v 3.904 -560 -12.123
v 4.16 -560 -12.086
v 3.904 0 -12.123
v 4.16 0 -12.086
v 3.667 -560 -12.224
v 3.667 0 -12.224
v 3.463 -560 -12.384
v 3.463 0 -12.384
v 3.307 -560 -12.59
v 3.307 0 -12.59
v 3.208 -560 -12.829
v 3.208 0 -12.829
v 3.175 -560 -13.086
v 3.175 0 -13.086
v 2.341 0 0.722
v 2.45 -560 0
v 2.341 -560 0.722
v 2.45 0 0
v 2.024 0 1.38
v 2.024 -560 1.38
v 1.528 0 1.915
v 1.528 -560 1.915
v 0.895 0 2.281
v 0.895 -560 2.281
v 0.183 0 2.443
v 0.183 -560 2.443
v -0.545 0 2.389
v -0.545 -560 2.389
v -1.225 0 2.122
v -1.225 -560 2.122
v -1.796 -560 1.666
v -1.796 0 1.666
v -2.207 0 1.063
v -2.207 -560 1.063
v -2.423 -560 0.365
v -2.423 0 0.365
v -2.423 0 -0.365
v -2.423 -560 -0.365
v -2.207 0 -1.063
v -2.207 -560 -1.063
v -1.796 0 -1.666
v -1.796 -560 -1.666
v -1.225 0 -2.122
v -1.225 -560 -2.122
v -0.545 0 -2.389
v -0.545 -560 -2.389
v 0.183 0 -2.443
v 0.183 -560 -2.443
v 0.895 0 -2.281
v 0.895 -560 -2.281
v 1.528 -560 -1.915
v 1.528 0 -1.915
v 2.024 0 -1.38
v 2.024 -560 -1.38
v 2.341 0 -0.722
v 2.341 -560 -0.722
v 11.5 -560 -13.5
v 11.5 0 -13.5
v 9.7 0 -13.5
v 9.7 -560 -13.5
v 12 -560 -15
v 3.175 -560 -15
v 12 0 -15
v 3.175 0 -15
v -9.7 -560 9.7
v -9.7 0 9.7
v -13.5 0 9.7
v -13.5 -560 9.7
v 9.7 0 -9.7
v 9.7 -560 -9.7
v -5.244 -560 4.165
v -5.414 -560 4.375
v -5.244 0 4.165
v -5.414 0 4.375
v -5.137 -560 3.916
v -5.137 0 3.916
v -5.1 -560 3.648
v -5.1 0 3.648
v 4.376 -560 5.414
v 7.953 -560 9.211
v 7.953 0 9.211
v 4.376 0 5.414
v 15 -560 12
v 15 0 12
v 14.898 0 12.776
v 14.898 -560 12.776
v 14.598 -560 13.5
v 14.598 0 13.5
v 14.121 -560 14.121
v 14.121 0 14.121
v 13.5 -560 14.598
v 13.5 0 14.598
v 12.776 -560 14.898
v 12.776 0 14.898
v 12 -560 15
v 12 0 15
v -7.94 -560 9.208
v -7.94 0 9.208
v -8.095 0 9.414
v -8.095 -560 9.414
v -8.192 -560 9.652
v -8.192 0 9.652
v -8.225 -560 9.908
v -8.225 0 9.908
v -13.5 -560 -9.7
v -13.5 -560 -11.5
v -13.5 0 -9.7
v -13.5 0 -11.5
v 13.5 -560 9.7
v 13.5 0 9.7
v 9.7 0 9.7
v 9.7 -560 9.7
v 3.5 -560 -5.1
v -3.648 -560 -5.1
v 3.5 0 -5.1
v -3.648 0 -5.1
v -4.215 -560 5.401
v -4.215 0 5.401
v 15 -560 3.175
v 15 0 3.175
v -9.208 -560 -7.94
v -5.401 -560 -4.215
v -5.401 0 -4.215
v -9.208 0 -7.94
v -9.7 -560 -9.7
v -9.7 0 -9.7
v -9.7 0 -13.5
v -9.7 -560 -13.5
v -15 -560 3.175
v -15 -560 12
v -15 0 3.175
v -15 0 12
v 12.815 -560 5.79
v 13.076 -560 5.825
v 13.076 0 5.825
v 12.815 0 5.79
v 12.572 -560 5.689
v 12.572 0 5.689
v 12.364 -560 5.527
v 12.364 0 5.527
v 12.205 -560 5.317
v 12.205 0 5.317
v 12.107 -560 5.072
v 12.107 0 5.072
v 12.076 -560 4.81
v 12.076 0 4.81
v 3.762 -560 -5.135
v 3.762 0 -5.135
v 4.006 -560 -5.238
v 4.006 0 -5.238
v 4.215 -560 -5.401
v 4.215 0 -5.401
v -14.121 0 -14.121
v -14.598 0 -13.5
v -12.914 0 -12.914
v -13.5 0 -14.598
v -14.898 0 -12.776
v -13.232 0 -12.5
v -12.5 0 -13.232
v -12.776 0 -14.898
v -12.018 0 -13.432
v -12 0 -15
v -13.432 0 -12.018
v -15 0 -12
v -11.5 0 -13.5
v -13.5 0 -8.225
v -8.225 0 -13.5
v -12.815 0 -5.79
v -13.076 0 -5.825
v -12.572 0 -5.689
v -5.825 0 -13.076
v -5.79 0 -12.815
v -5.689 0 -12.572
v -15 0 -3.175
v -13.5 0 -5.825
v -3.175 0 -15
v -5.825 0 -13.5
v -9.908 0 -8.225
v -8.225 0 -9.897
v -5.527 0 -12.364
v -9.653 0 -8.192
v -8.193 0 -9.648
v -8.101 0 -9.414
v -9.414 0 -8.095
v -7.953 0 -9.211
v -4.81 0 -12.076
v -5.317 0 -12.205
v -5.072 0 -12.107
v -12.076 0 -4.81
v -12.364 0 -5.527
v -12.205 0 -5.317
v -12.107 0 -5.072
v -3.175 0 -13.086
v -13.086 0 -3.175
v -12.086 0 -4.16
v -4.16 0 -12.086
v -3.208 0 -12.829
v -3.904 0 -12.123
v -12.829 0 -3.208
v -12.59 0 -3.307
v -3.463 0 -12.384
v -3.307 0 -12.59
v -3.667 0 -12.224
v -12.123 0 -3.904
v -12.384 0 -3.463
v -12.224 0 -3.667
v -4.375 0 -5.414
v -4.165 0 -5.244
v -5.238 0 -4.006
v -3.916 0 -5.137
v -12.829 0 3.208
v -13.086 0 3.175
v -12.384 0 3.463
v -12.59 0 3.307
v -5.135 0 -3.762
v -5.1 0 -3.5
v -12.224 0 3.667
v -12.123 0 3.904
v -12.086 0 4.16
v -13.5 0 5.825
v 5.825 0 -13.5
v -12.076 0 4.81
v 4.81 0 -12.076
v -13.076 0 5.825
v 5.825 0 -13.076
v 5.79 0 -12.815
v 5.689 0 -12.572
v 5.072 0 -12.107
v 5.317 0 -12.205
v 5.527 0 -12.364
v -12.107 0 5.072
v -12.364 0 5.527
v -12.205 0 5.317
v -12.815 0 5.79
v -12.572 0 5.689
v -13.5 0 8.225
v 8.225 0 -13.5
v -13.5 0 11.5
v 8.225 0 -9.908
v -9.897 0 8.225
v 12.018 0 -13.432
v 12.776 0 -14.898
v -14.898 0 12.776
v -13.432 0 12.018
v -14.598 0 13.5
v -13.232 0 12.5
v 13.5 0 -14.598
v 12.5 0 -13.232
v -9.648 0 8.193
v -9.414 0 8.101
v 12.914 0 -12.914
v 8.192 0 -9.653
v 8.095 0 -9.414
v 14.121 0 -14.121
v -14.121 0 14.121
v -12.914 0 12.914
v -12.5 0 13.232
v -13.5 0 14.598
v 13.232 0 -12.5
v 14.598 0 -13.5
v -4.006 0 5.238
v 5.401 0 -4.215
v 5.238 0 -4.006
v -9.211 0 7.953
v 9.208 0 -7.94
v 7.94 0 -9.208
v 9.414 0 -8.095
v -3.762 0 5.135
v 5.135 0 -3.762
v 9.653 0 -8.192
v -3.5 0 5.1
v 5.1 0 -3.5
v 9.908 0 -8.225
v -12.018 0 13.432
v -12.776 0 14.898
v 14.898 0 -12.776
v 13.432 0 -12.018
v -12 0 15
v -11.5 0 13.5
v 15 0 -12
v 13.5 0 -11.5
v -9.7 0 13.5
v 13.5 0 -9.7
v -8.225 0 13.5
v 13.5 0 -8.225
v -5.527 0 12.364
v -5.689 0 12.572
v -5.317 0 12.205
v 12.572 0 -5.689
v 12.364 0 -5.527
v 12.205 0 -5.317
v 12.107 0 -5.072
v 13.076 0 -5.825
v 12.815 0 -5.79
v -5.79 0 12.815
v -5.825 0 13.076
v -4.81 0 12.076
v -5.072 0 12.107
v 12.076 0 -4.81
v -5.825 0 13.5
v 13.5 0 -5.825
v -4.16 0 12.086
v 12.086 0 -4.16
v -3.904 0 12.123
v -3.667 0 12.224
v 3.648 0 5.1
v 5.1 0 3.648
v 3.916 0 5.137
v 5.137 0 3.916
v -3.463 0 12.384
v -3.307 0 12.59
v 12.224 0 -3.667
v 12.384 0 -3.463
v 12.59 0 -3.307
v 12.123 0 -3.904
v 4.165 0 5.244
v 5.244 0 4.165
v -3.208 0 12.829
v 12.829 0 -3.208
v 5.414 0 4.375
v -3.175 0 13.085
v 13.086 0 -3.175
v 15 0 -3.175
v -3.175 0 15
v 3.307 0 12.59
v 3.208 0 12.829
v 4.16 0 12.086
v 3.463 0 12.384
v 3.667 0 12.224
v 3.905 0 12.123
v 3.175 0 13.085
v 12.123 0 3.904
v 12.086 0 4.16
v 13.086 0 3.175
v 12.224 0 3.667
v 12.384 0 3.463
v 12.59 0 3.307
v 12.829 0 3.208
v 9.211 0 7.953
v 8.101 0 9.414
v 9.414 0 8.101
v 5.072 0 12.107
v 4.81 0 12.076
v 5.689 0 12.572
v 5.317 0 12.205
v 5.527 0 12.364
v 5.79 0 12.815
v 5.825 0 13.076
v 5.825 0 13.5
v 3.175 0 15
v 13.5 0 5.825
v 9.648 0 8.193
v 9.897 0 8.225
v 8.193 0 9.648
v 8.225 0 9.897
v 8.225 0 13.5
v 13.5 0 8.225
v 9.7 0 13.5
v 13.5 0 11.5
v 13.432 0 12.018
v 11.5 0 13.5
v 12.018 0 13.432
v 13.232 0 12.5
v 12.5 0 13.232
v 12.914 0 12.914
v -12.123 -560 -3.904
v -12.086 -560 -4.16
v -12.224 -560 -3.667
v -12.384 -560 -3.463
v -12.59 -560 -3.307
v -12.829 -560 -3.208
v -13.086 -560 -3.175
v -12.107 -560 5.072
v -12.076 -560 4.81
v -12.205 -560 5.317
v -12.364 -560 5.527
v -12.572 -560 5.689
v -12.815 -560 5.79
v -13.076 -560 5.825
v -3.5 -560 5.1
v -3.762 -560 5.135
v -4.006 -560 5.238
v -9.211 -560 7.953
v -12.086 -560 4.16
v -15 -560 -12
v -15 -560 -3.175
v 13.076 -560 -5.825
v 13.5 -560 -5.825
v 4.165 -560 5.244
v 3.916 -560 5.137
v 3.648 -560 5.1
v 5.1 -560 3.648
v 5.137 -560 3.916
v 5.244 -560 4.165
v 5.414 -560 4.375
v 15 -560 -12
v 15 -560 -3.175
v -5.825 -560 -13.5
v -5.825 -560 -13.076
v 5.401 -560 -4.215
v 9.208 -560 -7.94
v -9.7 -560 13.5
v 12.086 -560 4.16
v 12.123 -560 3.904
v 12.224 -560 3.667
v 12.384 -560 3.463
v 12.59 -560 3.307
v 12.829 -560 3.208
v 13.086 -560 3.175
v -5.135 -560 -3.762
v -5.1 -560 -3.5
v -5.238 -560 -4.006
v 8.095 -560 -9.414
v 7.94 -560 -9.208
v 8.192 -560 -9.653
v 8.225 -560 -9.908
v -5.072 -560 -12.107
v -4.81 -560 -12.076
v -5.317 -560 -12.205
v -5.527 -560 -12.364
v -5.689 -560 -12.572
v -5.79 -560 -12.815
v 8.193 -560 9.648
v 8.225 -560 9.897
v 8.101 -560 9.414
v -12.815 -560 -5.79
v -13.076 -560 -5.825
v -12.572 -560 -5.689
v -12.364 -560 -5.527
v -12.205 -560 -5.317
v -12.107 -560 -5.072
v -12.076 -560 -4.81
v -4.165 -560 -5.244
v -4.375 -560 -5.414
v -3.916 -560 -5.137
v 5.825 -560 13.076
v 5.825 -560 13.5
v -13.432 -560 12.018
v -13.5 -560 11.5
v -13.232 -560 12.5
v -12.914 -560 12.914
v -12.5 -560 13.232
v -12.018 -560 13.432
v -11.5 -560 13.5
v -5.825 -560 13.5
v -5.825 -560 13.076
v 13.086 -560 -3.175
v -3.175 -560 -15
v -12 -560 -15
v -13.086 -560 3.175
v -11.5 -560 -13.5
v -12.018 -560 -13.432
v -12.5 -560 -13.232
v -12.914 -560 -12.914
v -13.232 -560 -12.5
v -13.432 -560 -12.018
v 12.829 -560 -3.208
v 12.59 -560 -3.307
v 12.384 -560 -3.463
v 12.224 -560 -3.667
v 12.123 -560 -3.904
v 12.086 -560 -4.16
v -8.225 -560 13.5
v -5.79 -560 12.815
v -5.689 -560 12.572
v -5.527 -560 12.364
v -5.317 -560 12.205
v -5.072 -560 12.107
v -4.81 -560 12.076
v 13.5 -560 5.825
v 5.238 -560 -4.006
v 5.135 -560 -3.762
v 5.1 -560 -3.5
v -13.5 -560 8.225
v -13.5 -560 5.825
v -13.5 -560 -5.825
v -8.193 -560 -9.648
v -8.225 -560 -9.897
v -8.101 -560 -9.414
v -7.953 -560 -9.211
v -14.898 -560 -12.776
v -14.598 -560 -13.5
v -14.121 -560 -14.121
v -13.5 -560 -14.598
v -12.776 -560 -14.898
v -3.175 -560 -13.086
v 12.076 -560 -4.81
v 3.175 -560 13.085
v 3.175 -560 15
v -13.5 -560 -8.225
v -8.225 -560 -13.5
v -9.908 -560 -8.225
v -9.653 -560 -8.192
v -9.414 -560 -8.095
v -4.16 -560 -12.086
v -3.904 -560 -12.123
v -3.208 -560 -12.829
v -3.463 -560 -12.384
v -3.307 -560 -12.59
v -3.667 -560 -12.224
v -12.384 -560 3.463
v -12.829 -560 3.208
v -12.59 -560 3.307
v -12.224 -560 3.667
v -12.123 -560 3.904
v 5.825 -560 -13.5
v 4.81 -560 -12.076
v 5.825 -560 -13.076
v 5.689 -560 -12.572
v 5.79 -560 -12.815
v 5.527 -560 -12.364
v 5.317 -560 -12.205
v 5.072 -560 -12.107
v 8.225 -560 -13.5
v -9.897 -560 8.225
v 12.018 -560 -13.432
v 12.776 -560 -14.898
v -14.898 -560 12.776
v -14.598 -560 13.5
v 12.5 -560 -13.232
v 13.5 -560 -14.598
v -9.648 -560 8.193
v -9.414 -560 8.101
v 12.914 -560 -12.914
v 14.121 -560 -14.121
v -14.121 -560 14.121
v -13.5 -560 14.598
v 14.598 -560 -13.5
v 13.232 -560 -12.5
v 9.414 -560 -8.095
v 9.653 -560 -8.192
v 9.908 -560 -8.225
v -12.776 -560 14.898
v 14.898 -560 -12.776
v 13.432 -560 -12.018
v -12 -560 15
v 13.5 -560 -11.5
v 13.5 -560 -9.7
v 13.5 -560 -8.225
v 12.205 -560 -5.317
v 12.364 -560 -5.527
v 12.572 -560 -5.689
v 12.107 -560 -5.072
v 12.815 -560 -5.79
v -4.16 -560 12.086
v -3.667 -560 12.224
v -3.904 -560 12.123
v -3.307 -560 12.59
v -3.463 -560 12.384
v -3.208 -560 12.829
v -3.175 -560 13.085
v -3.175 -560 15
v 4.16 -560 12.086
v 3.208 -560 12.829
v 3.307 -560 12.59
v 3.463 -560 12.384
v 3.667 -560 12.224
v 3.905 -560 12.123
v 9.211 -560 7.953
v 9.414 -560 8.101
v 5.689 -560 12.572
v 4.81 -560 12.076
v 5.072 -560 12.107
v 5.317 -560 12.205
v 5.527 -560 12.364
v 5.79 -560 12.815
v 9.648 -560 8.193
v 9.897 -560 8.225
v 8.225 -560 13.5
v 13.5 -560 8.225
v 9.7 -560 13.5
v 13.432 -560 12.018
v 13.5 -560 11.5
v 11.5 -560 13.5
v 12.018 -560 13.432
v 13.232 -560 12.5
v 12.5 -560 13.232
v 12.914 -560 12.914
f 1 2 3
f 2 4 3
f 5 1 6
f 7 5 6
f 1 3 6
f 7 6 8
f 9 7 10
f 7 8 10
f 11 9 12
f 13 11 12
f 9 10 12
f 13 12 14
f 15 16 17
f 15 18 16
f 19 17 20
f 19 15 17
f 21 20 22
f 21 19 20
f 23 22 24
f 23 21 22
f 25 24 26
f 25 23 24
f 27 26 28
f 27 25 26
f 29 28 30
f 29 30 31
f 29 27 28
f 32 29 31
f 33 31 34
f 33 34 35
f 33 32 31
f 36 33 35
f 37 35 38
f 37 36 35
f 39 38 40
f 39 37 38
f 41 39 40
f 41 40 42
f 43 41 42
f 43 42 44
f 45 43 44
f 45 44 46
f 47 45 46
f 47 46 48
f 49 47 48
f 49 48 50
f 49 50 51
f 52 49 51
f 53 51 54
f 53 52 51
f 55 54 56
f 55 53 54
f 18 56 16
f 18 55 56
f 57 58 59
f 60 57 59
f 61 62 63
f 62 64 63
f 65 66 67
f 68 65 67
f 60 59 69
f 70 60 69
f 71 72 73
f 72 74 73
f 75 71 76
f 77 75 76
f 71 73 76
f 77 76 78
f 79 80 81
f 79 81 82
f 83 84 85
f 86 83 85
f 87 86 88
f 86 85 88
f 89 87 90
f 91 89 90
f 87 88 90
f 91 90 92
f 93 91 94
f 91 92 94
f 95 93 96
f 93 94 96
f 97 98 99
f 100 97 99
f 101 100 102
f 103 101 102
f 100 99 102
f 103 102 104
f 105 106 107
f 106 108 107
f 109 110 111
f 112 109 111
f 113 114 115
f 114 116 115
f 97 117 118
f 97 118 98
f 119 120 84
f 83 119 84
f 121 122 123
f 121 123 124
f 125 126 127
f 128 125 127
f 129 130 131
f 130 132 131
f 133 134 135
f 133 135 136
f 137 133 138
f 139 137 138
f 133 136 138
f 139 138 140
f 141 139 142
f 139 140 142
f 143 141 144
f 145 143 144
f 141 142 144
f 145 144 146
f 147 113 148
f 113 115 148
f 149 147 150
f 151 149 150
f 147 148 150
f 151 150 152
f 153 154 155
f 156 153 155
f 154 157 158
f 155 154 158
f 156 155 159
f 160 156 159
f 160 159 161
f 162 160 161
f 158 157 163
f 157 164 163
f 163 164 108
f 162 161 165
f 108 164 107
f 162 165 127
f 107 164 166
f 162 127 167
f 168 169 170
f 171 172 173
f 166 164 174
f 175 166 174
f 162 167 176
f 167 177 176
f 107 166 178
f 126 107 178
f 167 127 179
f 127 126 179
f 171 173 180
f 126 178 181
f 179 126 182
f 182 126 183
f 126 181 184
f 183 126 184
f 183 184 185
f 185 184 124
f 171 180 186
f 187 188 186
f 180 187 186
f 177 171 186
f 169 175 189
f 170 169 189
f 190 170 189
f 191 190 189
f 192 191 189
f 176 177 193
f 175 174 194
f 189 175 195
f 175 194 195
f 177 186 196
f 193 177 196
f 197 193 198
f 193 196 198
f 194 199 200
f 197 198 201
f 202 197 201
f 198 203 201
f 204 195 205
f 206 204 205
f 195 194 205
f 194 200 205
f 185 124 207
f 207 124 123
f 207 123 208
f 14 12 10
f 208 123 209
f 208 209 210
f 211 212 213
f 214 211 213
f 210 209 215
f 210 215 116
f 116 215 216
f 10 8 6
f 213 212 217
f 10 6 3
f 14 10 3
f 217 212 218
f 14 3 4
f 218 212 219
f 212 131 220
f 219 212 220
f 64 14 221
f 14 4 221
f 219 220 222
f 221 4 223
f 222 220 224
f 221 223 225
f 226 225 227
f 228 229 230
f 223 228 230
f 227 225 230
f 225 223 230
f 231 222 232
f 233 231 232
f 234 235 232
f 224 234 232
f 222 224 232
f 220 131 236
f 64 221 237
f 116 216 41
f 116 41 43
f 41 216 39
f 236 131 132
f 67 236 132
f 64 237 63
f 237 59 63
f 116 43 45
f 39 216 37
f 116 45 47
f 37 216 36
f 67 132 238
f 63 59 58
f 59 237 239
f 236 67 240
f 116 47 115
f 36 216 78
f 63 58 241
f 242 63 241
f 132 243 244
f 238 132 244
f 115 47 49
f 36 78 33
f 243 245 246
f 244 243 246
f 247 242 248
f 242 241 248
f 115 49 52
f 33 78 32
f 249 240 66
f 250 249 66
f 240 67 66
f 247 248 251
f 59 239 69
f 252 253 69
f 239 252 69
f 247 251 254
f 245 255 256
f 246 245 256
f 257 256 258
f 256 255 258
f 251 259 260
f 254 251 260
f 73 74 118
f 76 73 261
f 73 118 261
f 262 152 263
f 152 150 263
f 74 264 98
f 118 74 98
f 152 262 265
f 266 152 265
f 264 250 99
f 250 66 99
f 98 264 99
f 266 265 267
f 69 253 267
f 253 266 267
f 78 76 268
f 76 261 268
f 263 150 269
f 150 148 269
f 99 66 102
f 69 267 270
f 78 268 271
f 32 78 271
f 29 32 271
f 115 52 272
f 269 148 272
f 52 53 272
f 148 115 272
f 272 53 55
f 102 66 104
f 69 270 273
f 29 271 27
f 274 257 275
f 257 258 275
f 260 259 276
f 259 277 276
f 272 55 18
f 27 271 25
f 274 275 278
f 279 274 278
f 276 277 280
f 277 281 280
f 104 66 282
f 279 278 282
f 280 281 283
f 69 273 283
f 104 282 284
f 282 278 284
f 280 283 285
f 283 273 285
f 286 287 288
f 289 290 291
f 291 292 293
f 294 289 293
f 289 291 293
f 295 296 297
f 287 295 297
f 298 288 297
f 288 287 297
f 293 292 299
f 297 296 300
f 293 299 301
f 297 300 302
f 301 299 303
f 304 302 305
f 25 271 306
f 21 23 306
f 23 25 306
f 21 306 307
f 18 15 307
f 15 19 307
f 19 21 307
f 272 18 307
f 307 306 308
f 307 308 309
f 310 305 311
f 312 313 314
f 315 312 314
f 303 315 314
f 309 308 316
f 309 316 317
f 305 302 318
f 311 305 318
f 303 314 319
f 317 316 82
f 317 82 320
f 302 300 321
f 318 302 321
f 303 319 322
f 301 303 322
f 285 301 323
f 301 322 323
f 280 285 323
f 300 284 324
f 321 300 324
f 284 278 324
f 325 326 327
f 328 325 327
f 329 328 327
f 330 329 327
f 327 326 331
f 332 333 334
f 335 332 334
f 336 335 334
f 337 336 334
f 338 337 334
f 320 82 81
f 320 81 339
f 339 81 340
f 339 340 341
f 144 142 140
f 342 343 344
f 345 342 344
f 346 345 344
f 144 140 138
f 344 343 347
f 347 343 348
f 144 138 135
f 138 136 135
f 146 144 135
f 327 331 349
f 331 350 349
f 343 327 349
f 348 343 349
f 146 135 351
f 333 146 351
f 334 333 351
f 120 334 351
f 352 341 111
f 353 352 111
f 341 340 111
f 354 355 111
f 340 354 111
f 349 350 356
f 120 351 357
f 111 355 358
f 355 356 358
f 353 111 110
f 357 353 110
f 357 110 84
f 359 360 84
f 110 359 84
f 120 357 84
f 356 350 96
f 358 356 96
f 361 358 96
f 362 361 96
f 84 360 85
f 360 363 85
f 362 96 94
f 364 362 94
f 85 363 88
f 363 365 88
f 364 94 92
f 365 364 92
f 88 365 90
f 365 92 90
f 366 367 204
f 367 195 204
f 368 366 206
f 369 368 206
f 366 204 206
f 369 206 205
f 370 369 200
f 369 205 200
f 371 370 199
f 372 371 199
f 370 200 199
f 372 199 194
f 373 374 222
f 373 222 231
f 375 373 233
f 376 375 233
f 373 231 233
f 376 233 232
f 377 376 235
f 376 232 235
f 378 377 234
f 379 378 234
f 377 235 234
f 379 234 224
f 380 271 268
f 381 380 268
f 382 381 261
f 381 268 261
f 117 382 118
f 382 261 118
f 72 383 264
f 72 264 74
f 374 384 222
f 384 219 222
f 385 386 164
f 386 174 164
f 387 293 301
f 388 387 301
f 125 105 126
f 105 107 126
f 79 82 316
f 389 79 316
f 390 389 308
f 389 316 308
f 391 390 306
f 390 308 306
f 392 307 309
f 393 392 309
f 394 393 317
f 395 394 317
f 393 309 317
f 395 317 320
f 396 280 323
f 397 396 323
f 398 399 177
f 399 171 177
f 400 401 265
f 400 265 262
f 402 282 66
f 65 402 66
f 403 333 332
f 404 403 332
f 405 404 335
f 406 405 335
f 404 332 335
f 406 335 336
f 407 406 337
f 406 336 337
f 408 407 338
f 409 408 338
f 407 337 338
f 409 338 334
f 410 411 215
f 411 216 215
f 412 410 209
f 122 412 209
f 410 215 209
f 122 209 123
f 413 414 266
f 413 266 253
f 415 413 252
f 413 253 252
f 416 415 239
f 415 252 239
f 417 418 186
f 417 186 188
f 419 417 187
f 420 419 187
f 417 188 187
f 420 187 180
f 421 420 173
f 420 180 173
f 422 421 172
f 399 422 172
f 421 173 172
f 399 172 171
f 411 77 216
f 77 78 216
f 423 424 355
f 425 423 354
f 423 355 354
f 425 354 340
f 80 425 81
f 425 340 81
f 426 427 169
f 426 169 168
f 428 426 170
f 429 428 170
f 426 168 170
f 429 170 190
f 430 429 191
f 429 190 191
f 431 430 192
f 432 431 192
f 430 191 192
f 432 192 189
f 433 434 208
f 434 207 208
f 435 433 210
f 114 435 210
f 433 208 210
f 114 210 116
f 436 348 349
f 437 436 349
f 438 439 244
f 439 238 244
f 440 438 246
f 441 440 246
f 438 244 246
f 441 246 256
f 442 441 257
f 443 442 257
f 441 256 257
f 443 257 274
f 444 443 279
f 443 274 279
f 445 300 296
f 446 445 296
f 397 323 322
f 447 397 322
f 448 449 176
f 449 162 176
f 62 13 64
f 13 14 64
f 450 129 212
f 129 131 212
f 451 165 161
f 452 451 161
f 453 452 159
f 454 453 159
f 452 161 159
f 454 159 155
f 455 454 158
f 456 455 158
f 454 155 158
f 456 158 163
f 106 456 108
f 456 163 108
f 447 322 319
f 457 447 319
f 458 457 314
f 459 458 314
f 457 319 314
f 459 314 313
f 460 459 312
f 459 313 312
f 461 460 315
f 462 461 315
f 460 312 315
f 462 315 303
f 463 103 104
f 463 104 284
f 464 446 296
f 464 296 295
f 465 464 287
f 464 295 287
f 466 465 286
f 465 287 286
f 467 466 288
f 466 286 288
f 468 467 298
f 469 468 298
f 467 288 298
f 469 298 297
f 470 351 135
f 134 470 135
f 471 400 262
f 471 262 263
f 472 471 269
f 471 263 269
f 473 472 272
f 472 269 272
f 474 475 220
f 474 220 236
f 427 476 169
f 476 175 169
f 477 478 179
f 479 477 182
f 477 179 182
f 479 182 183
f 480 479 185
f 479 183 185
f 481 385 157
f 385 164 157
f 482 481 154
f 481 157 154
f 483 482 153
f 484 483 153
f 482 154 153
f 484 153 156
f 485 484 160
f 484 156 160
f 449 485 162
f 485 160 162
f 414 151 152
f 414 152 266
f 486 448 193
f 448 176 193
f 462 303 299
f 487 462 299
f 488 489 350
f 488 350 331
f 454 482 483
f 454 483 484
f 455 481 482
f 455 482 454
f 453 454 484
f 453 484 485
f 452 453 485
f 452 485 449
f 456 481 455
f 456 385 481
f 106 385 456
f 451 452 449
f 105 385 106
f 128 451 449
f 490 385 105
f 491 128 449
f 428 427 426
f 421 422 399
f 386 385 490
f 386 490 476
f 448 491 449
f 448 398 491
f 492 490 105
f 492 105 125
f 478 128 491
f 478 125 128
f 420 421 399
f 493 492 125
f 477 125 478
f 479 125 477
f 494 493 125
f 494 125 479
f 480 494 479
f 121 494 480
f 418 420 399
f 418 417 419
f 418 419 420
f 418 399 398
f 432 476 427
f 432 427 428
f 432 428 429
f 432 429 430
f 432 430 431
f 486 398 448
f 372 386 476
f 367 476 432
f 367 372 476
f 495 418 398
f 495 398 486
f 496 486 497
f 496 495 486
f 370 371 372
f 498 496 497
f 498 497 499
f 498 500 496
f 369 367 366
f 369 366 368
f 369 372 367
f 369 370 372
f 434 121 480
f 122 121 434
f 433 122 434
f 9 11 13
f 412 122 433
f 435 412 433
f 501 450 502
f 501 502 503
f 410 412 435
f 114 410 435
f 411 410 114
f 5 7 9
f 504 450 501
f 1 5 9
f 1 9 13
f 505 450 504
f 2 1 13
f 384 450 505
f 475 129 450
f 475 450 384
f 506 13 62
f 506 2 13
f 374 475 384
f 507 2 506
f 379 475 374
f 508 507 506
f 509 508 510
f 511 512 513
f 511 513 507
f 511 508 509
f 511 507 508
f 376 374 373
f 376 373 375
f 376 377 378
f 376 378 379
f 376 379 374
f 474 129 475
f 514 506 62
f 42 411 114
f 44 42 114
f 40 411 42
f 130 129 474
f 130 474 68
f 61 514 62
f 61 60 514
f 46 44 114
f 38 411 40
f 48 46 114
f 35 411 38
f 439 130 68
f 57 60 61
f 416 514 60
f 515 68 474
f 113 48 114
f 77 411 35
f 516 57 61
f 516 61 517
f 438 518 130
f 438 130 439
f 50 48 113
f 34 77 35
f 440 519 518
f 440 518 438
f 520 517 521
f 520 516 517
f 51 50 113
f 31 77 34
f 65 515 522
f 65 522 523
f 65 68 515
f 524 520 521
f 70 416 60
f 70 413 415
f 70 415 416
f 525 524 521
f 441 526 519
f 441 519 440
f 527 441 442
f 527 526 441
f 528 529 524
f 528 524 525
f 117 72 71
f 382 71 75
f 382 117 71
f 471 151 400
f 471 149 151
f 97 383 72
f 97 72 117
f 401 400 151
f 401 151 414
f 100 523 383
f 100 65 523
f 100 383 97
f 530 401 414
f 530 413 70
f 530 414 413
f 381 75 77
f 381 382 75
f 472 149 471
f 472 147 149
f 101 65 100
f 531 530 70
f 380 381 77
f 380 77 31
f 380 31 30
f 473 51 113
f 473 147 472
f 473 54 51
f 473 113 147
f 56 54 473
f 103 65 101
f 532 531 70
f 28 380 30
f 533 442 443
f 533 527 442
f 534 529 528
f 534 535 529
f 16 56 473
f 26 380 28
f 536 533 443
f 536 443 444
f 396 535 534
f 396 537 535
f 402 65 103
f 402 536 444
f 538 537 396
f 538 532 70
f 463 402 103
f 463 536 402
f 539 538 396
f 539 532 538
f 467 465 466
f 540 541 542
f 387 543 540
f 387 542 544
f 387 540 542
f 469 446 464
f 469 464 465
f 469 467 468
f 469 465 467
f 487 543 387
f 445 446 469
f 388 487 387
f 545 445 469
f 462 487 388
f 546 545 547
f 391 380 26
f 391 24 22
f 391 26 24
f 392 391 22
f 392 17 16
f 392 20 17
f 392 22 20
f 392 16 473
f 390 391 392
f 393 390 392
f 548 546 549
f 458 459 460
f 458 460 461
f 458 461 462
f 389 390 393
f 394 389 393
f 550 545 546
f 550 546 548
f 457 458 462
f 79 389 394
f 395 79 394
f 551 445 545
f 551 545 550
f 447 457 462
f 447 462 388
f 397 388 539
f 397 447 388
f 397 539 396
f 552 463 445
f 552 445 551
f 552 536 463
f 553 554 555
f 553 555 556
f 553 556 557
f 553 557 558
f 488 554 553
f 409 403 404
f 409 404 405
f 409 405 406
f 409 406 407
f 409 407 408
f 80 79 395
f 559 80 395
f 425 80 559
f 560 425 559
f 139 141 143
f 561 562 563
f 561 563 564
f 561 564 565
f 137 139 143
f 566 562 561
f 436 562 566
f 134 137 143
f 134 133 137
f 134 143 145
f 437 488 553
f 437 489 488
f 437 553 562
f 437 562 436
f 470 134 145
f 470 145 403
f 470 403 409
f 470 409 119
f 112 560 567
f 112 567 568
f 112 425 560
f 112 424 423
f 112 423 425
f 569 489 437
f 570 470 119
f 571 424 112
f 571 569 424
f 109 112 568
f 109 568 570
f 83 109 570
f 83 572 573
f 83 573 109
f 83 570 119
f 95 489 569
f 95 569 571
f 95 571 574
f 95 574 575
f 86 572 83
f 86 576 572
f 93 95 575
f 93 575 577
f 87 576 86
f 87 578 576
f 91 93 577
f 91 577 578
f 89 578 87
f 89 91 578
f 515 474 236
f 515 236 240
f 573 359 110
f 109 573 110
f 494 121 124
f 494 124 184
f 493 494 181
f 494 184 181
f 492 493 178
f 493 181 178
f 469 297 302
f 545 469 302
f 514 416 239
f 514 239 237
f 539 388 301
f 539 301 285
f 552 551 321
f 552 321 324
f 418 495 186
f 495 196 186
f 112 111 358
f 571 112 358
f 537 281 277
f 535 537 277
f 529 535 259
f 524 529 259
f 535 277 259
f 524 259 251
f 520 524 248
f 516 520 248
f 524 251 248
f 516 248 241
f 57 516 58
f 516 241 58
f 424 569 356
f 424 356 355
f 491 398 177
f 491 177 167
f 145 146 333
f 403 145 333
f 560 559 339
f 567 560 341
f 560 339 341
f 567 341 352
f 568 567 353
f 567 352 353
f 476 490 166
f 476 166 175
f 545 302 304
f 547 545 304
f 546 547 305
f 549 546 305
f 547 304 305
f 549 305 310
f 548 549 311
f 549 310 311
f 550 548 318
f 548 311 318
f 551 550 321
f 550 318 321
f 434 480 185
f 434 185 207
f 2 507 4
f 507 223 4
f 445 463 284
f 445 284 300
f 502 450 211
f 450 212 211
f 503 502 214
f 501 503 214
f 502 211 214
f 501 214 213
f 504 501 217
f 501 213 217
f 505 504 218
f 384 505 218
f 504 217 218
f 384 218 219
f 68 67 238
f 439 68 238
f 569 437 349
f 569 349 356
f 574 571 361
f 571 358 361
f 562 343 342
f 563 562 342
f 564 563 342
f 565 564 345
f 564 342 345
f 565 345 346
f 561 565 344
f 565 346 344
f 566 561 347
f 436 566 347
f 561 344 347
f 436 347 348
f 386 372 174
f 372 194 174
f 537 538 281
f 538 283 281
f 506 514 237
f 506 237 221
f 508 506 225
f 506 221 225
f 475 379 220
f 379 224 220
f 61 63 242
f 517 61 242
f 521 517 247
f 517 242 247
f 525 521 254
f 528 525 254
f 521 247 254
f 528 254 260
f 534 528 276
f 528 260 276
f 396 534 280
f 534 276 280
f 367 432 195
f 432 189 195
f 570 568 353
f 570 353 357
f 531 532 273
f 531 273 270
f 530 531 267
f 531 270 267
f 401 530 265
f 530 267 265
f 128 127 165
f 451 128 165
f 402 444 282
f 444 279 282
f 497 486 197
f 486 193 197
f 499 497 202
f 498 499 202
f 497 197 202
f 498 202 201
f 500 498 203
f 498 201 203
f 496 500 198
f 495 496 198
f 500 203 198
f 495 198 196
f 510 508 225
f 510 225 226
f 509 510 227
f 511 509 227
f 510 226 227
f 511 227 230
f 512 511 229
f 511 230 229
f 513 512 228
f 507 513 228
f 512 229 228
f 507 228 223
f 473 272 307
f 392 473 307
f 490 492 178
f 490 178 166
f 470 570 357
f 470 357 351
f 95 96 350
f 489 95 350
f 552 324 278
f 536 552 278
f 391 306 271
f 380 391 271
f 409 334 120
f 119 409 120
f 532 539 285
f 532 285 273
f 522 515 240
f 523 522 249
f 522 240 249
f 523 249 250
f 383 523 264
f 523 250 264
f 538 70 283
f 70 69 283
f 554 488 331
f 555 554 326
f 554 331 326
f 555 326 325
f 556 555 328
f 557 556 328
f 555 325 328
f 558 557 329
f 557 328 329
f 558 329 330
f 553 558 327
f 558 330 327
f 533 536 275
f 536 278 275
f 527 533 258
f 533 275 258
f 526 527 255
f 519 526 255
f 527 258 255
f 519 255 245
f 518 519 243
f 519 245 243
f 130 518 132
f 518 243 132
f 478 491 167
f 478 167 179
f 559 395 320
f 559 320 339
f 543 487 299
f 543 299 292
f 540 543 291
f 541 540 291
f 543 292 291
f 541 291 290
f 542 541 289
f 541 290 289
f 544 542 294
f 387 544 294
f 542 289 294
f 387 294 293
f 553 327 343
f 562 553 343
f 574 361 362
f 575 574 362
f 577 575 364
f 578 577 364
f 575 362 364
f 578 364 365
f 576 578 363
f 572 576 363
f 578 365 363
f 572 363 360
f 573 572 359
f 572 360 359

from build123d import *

# Parameters (mm, degrees)
F0_R     = 2.45
F1_DEPTH = 460
F2_DEPTH = 100


# Not quite as in the source:
# - ends of sketch curves that miss each other by under 0.0002 mm in the source are joined


with BuildPart() as f1:
    # F0 (on Front) → F1 (new body)
    with BuildSketch(Plane.XZ):
        with BuildLine():
            Line((-3.1749674082, 15), (-12, 15))
            ThreePointArc((-12, 15), (-14.1213203436, 14.1213203436), (-15, 12))
            Line((-15, 12), (-15, 3.175))
            Line((-15, 3.175), (-13.0855346263, 3.175))
            ThreePointArc((-13.0855346263, 3.175), (-12.3835980145, 3.4627605788), (-12.0856407741, 4.1604300138))
            Line((-12.0856407741, 4.1604300138), (-12.0761692778, 4.8104300138))
            ThreePointArc((-12.0761692778, 4.8104300138), (-12.3638237087, 5.5269366118), (-13.0760631299, 5.825))
            Line((-13.0760631299, 5.825), (-13.5, 5.825))
            Line((-13.5, 5.825), (-13.5, 8.225))
            Line((-13.5, 8.225), (-9.8968845016, 8.225))
            ThreePointArc((-9.8968845016, 8.225), (-9.5279915195, 8.1544718757), (-9.2111331975, 7.9528359354))
            Line((-9.2111331975, 7.9528359354), (-5.4142486959, 4.3754933338))
            ThreePointArc((-5.4142486959, 4.3754933338), (-5.1819174045, 4.0440465354), (-5.1, 3.6476573984))
            Line((-5.1, 3.6476573984), (-5.1, -3.4999243287))
            ThreePointArc((-5.1, -3.4999243287), (-5.1782354607, -3.8876744211), (-5.4007002683, -4.2147528992))
            Line((-5.4007002683, -4.2147528992), (-9.2084959767, -7.9398285705))
            ThreePointArc((-9.2084959767, -7.9398285705), (-9.5301904718, -8.1509666761), (-9.9077957084, -8.225))
            Line((-9.9077957084, -8.225), (-13.5, -8.225))
            Line((-13.5, -8.225), (-13.5, -5.825))
            Line((-13.5, -5.825), (-13.0760631299, -5.825))
            ThreePointArc((-13.0760631299, -5.825), (-12.3638237087, -5.5269366118), (-12.0761692778, -4.8104300138))
            Line((-12.0761692778, -4.8104300138), (-12.0856407741, -4.1604300138))
            ThreePointArc((-12.0856407741, -4.1604300138), (-12.3835980145, -3.4627605788), (-13.0855346263, -3.175))
            Line((-13.0855346263, -3.175), (-15, -3.175))
            Line((-15, -3.175), (-15, -12))
            ThreePointArc((-15, -12), (-14.1213203436, -14.1213203436), (-12, -15))
            Line((-12, -15), (-3.175, -15))
            Line((-3.175, -15), (-3.175, -13.0855346263))
            ThreePointArc((-3.175, -13.0855346263), (-3.4627605788, -12.3835980145), (-4.1604300138, -12.0856407741))
            Line((-4.1604300138, -12.0856407741), (-4.8104300138, -12.0761692778))
            ThreePointArc((-4.8104300138, -12.0761692778), (-5.5269366118, -12.3638237087), (-5.825, -13.0760631299))
            Line((-5.825, -13.0760631299), (-5.825, -13.5))
            Line((-5.825, -13.5), (-8.225, -13.5))
            Line((-8.225, -13.5), (-8.225, -9.8968845016))
            ThreePointArc((-8.225, -9.8968845016), (-8.1544718757, -9.5279915195), (-7.9528359354, -9.2111331975))
            Line((-7.9528359354, -9.2111331975), (-4.3754933338, -5.4142486959))
            ThreePointArc((-4.3754933338, -5.4142486959), (-4.0440465354, -5.1819174045), (-3.6476573984, -5.1))
            Line((-3.6476573984, -5.1), (3.4999243287, -5.1))
            ThreePointArc((3.4999243287, -5.1), (3.8876744211, -5.1782354607), (4.2147528992, -5.4007002683))
            Line((4.2147528992, -5.4007002683), (7.9398285705, -9.2084959767))
            ThreePointArc((7.9398285705, -9.2084959767), (8.1509666761, -9.5301904718), (8.225, -9.9077957084))
            Line((8.225, -9.9077957084), (8.225, -13.5))
            Line((8.225, -13.5), (5.825, -13.5))
            Line((5.825, -13.5), (5.825, -13.0760631299))
            ThreePointArc((5.825, -13.0760631299), (5.5269366118, -12.3638237087), (4.8104300138, -12.0761692778))
            Line((4.8104300138, -12.0761692778), (4.1604300138, -12.0856407741))
            ThreePointArc((4.1604300138, -12.0856407741), (3.4627605788, -12.3835980145), (3.175, -13.0855346263))
            Line((3.175, -13.0855346263), (3.175, -15))
            Line((3.175, -15), (12, -15))
            ThreePointArc((12, -15), (14.1213203436, -14.1213203436), (15, -12))
            Line((15, -12), (15, -3.175))
            Line((15, -3.175), (13.0855346263, -3.175))
            ThreePointArc((13.0855346263, -3.175), (12.3835980145, -3.4627605788), (12.0856407741, -4.1604300138))
            Line((12.0856407741, -4.1604300138), (12.0761692778, -4.8104300138))
            ThreePointArc((12.0761692778, -4.8104300138), (12.3638237087, -5.5269366118), (13.0760631299, -5.825))
            Line((13.0760631299, -5.825), (13.5, -5.825))
            Line((13.5, -5.825), (13.5, -8.225))
            Line((13.5, -8.225), (9.9077957084, -8.225))
            ThreePointArc((9.9077957084, -8.225), (9.5301904718, -8.1509666761), (9.2084959767, -7.9398285705))
            Line((9.2084959767, -7.9398285705), (5.4007002683, -4.2147528992))
            ThreePointArc((5.4007002683, -4.2147528992), (5.1782354607, -3.8876744211), (5.1, -3.4999243287))
            Line((5.1, -3.4999243287), (5.1, 3.6476573984))
            ThreePointArc((5.1, 3.6476573984), (5.1819174045, 4.0440465354), (5.4142486959, 4.3754933338))
            Line((5.4142486959, 4.3754933338), (9.2111331975, 7.9528359354))
            ThreePointArc((9.2111331975, 7.9528359354), (9.5279915195, 8.1544718757), (9.8968845016, 8.225))
            Line((9.8968845016, 8.225), (13.5, 8.225))
            Line((13.5, 8.225), (13.5, 5.825))
            Line((13.5, 5.825), (13.0760631299, 5.825))
            ThreePointArc((13.0760631299, 5.825), (12.3638237087, 5.5269366118), (12.0761692778, 4.8104300138))
            Line((12.0761692778, 4.8104300138), (12.0856407741, 4.1604300138))
            ThreePointArc((12.0856407741, 4.1604300138), (12.3835980145, 3.4627605788), (13.0855346263, 3.175))
            Line((13.0855346263, 3.175), (15, 3.175))
            Line((15, 3.175), (15, 12))
            ThreePointArc((15, 12), (14.1213203436, 14.1213203436), (12, 15))
            Line((12, 15), (3.1750325918, 15))
            Line((3.1750325918, 15), (3.1750325918, 13.0854824722))
            ThreePointArc((3.1750325918, 13.0854824722), (3.4627931706, 12.3835458604), (4.1604626057, 12.0855886201))
            Line((4.1604626057, 12.0855886201), (4.8104626057, 12.0761171237))
            ThreePointArc((4.8104626057, 12.0761171237), (5.5269692036, 12.3637715546), (5.8250325918, 13.0760109758))
            Line((5.8250325918, 13.0760109758), (5.8250325918, 13.4999478459))
            Line((5.8250325918, 13.4999478459), (8.2250325918, 13.4999478459))
            Line((8.2250325918, 13.4999478459), (8.2250325918, 9.8968323476))
            ThreePointArc((8.2250325918, 9.8968323476), (8.1545044675, 9.5279393654), (7.9528685272, 9.2110810434))
            Line((7.9528685272, 9.2110810434), (4.3755259256, 5.4141965418))
            ThreePointArc((4.3755259256, 5.4141965418), (4.0440791272, 5.1818652505), (3.6476899902, 5.0999478459))
            Line((3.6476899902, 5.0999478459), (-3.4998917369, 5.0999478459))
            ThreePointArc((-3.4998917369, 5.0999478459), (-3.8876418293, 5.1781833067), (-4.2147203074, 5.4006481142))
            Line((-4.2147203074, 5.4006481142), (-7.9397959787, 9.2084438226))
            ThreePointArc((-7.9397959787, 9.2084438226), (-8.1509340843, 9.5301383177), (-8.2249674082, 9.9077435543))
            Line((-8.2249674082, 9.9077435543), (-8.2249674082, 13.4999478459))
            Line((-8.2249674082, 13.4999478459), (-5.8249674082, 13.4999478459))
            Line((-5.8249674082, 13.4999478459), (-5.8249674082, 13.0760109758))
            ThreePointArc((-5.8249674082, 13.0760109758), (-5.5269040199, 12.3637715546), (-4.810397422, 12.0761171237))
            Line((-4.810397422, 12.0761171237), (-4.160397422, 12.0855886201))
            ThreePointArc((-4.160397422, 12.0855886201), (-3.462727987, 12.3835458604), (-3.1749674082, 13.0854824722))
            Line((-3.1749674082, 13.0854824722), (-3.1749674082, 15))
        make_face()
        with BuildLine():
            Line((-13.5, -11.5), (-13.5, -9.7))
            Line((-13.5, -9.7), (-9.7, -9.7))
            Line((-9.7, -9.7), (-9.7, -13.5))
            Line((-9.7, -13.5), (-11.5, -13.5))
            ThreePointArc((-11.5, -13.5), (-12.9142135624, -12.9142135624), (-13.5, -11.5))
        make_face(mode=Mode.SUBTRACT)
        with BuildLine():
            Line((9.7, -9.7), (13.5, -9.7))
            Line((13.5, -9.7), (13.5, -11.5))
            ThreePointArc((13.5, -11.5), (12.9142135624, -12.9142135624), (11.5, -13.5))
            Line((11.5, -13.5), (9.7, -13.5))
            Line((9.7, -13.5), (9.7, -9.7))
        make_face(mode=Mode.SUBTRACT)
        with BuildLine():
            ThreePointArc((-13.5, 11.5), (-12.9142135624, 12.9142135624), (-11.5, 13.5))
            Line((-11.5, 13.5), (-9.7, 13.5))
            Line((-9.7, 13.5), (-9.7, 9.7))
            Line((-9.7, 9.7), (-13.5, 9.7))
            Line((-13.5, 9.7), (-13.5, 11.5))
        make_face(mode=Mode.SUBTRACT)
        Circle(F0_R, mode=Mode.SUBTRACT)
        with BuildLine():
            Line((9.7, 13.5), (11.5, 13.5))
            ThreePointArc((11.5, 13.5), (12.9142135624, 12.9142135624), (13.5, 11.5))
            Line((13.5, 11.5), (13.5, 9.7))
            Line((13.5, 9.7), (9.7, 9.7))
            Line((9.7, 9.7), (9.7, 13.5))
        make_face(mode=Mode.SUBTRACT)
    extrude(amount=F1_DEPTH)

    # F2 (add): a face of the model
    f2_faces = [f1.faces().sort_by_distance(p)[0] for p in [
        (5.2291627207, -460, 12.6659491494),
    ]]
    extrude(f2_faces, amount=F2_DEPTH)


solid = f1.part
